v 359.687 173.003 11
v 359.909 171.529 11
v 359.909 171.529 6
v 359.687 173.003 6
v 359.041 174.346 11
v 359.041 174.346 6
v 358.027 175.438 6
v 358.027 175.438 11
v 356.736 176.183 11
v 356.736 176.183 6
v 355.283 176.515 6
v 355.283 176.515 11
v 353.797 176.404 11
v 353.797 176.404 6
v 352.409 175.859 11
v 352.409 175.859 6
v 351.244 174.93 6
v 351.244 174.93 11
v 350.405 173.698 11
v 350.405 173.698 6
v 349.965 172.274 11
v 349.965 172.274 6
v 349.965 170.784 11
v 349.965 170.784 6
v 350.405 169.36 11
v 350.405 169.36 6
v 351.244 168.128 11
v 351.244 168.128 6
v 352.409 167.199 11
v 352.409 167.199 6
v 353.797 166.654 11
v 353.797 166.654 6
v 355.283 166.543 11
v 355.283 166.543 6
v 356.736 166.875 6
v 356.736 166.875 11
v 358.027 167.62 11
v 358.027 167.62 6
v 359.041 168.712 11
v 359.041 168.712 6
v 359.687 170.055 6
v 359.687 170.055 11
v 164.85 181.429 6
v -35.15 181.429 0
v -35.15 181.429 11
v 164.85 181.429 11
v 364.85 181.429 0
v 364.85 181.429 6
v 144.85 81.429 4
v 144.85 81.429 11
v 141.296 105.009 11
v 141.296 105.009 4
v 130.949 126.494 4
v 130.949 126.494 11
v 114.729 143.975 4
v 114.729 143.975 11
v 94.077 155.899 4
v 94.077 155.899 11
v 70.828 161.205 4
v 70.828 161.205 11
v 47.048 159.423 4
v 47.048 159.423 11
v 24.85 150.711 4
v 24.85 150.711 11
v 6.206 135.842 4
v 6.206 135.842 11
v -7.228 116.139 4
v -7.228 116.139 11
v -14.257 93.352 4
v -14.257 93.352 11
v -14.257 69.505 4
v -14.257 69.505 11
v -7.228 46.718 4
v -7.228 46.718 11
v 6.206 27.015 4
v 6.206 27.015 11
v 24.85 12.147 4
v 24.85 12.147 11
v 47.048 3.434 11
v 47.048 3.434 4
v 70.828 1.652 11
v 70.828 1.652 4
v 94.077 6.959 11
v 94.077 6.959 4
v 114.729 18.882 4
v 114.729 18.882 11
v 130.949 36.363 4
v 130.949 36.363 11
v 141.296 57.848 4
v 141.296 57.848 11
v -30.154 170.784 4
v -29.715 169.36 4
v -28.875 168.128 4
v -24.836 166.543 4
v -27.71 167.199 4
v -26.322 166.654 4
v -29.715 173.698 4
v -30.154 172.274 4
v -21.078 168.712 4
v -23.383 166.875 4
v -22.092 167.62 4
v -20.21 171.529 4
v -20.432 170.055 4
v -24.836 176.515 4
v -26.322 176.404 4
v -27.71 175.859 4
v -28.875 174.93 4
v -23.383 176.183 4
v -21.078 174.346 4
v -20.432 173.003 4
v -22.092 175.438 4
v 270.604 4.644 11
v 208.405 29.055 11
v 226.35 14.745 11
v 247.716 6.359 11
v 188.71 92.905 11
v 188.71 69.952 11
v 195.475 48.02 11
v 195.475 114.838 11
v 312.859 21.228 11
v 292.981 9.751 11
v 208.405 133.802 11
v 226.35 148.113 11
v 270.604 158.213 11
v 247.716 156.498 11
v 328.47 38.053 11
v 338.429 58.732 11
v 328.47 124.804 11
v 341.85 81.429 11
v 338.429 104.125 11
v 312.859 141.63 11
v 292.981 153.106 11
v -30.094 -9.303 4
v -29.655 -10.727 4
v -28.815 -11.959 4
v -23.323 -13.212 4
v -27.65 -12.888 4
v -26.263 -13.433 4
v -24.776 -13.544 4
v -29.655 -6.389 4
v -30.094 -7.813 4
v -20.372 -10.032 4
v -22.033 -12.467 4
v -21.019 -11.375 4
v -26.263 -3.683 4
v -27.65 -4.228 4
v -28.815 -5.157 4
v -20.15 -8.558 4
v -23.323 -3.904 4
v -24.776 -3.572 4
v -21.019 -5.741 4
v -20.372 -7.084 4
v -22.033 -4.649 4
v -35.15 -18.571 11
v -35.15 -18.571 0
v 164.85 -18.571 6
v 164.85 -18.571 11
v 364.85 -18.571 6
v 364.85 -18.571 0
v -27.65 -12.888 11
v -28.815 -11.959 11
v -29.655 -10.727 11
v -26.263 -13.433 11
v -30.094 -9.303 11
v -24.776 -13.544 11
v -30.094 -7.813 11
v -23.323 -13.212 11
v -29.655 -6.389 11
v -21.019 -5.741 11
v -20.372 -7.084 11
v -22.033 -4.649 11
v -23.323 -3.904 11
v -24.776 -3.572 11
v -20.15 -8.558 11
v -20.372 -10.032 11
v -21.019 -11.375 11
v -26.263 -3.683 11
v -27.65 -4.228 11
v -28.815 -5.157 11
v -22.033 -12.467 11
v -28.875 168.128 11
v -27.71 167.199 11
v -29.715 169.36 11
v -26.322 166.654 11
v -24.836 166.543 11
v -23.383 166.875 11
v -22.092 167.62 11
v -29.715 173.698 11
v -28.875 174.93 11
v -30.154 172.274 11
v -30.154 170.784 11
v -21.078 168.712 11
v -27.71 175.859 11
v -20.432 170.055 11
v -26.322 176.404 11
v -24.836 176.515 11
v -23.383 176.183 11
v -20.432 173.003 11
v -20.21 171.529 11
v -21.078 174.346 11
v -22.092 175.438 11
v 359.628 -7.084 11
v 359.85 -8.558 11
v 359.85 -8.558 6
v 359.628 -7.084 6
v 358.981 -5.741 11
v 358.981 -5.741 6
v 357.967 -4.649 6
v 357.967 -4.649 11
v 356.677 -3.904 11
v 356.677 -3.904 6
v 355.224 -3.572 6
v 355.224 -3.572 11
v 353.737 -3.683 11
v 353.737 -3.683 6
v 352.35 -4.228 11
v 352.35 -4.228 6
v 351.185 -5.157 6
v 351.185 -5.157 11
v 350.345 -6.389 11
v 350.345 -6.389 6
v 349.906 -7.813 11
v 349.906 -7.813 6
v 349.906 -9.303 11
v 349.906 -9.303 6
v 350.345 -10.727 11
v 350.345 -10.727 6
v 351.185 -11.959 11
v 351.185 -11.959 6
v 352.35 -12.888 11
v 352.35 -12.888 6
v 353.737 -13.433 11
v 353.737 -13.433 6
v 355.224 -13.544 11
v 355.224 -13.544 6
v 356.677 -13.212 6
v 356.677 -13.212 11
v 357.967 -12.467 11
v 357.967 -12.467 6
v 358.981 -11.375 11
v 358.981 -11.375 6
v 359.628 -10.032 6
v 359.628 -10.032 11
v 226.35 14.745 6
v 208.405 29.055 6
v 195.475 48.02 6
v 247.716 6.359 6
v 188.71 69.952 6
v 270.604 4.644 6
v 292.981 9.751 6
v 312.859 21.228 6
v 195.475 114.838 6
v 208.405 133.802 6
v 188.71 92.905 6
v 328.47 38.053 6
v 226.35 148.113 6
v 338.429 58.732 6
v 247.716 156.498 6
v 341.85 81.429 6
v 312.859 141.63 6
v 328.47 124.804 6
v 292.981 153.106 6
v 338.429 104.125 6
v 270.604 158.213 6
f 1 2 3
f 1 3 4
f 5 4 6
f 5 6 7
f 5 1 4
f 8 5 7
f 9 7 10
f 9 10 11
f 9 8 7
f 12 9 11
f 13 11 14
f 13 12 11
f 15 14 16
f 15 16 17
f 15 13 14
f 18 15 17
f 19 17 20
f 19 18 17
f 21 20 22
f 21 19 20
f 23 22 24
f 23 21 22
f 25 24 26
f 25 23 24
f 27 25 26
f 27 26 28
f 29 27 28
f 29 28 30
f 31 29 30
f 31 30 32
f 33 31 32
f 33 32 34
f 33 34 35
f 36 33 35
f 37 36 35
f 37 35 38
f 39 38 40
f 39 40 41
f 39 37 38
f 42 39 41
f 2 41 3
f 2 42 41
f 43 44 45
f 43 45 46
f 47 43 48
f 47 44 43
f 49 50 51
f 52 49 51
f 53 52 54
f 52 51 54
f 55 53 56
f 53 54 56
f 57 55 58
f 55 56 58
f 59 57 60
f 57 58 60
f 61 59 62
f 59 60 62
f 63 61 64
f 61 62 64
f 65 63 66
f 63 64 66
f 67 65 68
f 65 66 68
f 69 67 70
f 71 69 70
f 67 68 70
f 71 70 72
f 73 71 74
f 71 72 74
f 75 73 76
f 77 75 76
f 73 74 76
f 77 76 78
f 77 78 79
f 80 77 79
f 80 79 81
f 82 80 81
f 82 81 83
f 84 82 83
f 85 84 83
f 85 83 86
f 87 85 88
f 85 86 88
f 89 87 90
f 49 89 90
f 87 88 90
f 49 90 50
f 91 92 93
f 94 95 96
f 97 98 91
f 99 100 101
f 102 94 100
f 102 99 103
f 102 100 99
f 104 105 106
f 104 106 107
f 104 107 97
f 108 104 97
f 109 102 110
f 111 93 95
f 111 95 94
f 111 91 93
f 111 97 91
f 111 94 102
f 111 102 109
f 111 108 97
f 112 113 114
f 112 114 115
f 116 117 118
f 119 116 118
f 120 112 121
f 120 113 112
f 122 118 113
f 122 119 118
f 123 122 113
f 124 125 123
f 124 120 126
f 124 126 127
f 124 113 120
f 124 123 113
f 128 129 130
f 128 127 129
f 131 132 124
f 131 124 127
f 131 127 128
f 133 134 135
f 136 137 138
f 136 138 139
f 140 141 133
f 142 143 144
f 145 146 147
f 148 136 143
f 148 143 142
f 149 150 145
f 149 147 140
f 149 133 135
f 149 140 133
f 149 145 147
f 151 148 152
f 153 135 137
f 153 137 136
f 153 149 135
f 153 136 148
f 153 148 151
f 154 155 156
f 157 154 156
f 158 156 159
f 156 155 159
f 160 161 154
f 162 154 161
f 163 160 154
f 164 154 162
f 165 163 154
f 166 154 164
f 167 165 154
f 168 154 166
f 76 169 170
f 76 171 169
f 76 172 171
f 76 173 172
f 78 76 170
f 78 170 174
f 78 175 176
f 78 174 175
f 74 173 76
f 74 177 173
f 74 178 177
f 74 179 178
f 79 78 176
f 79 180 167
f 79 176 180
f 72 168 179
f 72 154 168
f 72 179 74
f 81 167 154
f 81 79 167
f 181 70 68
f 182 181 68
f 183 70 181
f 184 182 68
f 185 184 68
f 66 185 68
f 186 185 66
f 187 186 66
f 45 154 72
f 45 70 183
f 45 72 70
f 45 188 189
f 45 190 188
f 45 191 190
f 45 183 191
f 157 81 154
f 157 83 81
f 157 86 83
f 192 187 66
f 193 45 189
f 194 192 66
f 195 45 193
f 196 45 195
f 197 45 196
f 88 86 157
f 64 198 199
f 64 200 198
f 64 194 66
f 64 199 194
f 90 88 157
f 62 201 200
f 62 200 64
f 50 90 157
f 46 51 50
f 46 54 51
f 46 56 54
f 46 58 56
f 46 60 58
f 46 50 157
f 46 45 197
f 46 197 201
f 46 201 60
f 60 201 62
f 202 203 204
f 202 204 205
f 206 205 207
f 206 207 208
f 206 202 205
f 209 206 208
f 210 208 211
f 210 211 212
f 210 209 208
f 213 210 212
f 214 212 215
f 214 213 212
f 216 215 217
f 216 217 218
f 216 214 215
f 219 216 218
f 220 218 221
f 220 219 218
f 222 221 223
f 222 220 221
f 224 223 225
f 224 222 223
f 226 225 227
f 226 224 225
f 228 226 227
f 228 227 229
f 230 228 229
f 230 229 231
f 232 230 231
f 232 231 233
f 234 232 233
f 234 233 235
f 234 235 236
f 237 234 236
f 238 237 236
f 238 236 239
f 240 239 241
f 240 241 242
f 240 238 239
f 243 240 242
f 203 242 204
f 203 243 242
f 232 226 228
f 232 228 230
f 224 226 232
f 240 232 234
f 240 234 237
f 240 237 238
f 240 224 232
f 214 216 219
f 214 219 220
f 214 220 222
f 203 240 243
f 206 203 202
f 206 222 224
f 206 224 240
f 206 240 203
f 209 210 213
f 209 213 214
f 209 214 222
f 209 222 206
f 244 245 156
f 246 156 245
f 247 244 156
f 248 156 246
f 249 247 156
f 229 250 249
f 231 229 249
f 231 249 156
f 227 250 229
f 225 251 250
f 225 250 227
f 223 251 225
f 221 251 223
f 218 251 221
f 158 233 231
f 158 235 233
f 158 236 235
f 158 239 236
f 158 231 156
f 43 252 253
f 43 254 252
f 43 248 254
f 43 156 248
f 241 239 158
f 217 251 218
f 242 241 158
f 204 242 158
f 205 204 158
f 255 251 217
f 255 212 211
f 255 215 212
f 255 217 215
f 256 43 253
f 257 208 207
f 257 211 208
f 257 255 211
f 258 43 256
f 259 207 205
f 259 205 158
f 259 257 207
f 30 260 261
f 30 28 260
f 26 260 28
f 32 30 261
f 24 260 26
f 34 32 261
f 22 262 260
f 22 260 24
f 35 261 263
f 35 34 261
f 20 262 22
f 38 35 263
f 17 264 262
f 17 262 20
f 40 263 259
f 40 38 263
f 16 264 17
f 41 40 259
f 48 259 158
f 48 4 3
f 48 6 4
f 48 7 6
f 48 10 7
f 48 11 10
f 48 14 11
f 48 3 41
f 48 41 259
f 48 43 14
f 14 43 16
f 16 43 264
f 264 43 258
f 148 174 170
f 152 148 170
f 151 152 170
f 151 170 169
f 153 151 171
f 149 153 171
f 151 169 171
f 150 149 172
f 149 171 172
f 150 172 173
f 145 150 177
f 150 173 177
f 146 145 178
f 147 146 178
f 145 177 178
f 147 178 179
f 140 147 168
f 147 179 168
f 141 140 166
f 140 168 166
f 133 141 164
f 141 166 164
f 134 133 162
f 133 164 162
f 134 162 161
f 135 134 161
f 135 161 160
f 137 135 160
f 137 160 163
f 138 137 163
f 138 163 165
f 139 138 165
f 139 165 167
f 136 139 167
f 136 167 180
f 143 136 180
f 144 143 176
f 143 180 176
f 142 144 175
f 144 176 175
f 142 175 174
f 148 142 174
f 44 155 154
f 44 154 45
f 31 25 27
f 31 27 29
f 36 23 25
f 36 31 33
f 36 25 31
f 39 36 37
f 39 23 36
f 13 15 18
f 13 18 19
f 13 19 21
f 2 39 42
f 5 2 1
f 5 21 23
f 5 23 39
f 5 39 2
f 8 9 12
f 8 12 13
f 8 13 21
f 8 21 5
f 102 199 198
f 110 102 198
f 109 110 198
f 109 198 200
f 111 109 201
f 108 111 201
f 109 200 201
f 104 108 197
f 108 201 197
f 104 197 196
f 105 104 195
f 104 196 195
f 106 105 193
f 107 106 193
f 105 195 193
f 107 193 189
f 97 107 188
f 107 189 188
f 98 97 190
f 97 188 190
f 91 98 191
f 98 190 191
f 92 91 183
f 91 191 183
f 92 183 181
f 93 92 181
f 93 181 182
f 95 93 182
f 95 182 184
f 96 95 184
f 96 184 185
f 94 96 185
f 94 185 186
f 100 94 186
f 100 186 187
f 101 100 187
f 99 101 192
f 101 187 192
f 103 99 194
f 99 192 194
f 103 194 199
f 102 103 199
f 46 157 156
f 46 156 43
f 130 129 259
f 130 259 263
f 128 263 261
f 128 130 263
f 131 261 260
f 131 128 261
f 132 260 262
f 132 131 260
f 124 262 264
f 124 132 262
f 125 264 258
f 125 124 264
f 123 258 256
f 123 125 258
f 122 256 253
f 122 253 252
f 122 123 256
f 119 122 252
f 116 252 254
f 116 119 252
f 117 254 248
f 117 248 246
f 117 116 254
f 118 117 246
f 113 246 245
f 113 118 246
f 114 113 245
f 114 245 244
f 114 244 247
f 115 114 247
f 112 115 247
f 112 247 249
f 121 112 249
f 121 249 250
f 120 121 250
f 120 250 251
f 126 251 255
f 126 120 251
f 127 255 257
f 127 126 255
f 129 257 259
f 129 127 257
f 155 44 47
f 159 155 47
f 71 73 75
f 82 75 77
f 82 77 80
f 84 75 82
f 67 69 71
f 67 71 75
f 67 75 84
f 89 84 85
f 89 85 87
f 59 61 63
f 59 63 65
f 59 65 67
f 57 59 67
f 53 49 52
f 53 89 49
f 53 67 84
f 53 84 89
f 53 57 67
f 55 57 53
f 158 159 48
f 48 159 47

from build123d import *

# Parameters (mm, degrees)
F0_W     = 400
F0_H     = 200
F1_DEPTH = 11
F2_R     = 5
F2_R_2   = 80
F3_DEPTH = 7
F2_W     = 200
F2_H     = 200
F2_R_3   = 77
F4_DEPTH = 5


with BuildPart() as f1:
    # F0 (on Top) → F1 (new body)
    with BuildSketch(Plane.XY):
        with Locations((164.849856, 81.428634)):
            Rectangle(F0_W, F0_H)
    extrude(amount=F1_DEPTH)

    # F2 (on face) → F3 (cut)
    with BuildSketch(Plane.XY.offset(11)):
        with Locations((-25.150144, -8.558058)):
            Circle(F2_R)
        with Locations((64.849856, 81.428634)):
            Circle(F2_R_2)
        with Locations((-25.209671, 171.52901)):
            Circle(F2_R)
    extrude(amount=-F3_DEPTH, mode=Mode.SUBTRACT)

    # F2 (on face) → F4 (cut)
    with BuildSketch(Plane.XY.offset(11)):
        with Locations((264.849856, 81.428634)):
            Rectangle(F2_W, F2_H)
        with Locations((354.849856, -8.558058)):
            Circle(F2_R, mode=Mode.SUBTRACT)
        with Locations((264.849856, 81.428634)):
            Circle(F2_R_3, mode=Mode.SUBTRACT)
        with Locations((354.909382, 171.52901)):
            Circle(F2_R, mode=Mode.SUBTRACT)
    extrude(amount=-F4_DEPTH, mode=Mode.SUBTRACT)


solid = f1.part
